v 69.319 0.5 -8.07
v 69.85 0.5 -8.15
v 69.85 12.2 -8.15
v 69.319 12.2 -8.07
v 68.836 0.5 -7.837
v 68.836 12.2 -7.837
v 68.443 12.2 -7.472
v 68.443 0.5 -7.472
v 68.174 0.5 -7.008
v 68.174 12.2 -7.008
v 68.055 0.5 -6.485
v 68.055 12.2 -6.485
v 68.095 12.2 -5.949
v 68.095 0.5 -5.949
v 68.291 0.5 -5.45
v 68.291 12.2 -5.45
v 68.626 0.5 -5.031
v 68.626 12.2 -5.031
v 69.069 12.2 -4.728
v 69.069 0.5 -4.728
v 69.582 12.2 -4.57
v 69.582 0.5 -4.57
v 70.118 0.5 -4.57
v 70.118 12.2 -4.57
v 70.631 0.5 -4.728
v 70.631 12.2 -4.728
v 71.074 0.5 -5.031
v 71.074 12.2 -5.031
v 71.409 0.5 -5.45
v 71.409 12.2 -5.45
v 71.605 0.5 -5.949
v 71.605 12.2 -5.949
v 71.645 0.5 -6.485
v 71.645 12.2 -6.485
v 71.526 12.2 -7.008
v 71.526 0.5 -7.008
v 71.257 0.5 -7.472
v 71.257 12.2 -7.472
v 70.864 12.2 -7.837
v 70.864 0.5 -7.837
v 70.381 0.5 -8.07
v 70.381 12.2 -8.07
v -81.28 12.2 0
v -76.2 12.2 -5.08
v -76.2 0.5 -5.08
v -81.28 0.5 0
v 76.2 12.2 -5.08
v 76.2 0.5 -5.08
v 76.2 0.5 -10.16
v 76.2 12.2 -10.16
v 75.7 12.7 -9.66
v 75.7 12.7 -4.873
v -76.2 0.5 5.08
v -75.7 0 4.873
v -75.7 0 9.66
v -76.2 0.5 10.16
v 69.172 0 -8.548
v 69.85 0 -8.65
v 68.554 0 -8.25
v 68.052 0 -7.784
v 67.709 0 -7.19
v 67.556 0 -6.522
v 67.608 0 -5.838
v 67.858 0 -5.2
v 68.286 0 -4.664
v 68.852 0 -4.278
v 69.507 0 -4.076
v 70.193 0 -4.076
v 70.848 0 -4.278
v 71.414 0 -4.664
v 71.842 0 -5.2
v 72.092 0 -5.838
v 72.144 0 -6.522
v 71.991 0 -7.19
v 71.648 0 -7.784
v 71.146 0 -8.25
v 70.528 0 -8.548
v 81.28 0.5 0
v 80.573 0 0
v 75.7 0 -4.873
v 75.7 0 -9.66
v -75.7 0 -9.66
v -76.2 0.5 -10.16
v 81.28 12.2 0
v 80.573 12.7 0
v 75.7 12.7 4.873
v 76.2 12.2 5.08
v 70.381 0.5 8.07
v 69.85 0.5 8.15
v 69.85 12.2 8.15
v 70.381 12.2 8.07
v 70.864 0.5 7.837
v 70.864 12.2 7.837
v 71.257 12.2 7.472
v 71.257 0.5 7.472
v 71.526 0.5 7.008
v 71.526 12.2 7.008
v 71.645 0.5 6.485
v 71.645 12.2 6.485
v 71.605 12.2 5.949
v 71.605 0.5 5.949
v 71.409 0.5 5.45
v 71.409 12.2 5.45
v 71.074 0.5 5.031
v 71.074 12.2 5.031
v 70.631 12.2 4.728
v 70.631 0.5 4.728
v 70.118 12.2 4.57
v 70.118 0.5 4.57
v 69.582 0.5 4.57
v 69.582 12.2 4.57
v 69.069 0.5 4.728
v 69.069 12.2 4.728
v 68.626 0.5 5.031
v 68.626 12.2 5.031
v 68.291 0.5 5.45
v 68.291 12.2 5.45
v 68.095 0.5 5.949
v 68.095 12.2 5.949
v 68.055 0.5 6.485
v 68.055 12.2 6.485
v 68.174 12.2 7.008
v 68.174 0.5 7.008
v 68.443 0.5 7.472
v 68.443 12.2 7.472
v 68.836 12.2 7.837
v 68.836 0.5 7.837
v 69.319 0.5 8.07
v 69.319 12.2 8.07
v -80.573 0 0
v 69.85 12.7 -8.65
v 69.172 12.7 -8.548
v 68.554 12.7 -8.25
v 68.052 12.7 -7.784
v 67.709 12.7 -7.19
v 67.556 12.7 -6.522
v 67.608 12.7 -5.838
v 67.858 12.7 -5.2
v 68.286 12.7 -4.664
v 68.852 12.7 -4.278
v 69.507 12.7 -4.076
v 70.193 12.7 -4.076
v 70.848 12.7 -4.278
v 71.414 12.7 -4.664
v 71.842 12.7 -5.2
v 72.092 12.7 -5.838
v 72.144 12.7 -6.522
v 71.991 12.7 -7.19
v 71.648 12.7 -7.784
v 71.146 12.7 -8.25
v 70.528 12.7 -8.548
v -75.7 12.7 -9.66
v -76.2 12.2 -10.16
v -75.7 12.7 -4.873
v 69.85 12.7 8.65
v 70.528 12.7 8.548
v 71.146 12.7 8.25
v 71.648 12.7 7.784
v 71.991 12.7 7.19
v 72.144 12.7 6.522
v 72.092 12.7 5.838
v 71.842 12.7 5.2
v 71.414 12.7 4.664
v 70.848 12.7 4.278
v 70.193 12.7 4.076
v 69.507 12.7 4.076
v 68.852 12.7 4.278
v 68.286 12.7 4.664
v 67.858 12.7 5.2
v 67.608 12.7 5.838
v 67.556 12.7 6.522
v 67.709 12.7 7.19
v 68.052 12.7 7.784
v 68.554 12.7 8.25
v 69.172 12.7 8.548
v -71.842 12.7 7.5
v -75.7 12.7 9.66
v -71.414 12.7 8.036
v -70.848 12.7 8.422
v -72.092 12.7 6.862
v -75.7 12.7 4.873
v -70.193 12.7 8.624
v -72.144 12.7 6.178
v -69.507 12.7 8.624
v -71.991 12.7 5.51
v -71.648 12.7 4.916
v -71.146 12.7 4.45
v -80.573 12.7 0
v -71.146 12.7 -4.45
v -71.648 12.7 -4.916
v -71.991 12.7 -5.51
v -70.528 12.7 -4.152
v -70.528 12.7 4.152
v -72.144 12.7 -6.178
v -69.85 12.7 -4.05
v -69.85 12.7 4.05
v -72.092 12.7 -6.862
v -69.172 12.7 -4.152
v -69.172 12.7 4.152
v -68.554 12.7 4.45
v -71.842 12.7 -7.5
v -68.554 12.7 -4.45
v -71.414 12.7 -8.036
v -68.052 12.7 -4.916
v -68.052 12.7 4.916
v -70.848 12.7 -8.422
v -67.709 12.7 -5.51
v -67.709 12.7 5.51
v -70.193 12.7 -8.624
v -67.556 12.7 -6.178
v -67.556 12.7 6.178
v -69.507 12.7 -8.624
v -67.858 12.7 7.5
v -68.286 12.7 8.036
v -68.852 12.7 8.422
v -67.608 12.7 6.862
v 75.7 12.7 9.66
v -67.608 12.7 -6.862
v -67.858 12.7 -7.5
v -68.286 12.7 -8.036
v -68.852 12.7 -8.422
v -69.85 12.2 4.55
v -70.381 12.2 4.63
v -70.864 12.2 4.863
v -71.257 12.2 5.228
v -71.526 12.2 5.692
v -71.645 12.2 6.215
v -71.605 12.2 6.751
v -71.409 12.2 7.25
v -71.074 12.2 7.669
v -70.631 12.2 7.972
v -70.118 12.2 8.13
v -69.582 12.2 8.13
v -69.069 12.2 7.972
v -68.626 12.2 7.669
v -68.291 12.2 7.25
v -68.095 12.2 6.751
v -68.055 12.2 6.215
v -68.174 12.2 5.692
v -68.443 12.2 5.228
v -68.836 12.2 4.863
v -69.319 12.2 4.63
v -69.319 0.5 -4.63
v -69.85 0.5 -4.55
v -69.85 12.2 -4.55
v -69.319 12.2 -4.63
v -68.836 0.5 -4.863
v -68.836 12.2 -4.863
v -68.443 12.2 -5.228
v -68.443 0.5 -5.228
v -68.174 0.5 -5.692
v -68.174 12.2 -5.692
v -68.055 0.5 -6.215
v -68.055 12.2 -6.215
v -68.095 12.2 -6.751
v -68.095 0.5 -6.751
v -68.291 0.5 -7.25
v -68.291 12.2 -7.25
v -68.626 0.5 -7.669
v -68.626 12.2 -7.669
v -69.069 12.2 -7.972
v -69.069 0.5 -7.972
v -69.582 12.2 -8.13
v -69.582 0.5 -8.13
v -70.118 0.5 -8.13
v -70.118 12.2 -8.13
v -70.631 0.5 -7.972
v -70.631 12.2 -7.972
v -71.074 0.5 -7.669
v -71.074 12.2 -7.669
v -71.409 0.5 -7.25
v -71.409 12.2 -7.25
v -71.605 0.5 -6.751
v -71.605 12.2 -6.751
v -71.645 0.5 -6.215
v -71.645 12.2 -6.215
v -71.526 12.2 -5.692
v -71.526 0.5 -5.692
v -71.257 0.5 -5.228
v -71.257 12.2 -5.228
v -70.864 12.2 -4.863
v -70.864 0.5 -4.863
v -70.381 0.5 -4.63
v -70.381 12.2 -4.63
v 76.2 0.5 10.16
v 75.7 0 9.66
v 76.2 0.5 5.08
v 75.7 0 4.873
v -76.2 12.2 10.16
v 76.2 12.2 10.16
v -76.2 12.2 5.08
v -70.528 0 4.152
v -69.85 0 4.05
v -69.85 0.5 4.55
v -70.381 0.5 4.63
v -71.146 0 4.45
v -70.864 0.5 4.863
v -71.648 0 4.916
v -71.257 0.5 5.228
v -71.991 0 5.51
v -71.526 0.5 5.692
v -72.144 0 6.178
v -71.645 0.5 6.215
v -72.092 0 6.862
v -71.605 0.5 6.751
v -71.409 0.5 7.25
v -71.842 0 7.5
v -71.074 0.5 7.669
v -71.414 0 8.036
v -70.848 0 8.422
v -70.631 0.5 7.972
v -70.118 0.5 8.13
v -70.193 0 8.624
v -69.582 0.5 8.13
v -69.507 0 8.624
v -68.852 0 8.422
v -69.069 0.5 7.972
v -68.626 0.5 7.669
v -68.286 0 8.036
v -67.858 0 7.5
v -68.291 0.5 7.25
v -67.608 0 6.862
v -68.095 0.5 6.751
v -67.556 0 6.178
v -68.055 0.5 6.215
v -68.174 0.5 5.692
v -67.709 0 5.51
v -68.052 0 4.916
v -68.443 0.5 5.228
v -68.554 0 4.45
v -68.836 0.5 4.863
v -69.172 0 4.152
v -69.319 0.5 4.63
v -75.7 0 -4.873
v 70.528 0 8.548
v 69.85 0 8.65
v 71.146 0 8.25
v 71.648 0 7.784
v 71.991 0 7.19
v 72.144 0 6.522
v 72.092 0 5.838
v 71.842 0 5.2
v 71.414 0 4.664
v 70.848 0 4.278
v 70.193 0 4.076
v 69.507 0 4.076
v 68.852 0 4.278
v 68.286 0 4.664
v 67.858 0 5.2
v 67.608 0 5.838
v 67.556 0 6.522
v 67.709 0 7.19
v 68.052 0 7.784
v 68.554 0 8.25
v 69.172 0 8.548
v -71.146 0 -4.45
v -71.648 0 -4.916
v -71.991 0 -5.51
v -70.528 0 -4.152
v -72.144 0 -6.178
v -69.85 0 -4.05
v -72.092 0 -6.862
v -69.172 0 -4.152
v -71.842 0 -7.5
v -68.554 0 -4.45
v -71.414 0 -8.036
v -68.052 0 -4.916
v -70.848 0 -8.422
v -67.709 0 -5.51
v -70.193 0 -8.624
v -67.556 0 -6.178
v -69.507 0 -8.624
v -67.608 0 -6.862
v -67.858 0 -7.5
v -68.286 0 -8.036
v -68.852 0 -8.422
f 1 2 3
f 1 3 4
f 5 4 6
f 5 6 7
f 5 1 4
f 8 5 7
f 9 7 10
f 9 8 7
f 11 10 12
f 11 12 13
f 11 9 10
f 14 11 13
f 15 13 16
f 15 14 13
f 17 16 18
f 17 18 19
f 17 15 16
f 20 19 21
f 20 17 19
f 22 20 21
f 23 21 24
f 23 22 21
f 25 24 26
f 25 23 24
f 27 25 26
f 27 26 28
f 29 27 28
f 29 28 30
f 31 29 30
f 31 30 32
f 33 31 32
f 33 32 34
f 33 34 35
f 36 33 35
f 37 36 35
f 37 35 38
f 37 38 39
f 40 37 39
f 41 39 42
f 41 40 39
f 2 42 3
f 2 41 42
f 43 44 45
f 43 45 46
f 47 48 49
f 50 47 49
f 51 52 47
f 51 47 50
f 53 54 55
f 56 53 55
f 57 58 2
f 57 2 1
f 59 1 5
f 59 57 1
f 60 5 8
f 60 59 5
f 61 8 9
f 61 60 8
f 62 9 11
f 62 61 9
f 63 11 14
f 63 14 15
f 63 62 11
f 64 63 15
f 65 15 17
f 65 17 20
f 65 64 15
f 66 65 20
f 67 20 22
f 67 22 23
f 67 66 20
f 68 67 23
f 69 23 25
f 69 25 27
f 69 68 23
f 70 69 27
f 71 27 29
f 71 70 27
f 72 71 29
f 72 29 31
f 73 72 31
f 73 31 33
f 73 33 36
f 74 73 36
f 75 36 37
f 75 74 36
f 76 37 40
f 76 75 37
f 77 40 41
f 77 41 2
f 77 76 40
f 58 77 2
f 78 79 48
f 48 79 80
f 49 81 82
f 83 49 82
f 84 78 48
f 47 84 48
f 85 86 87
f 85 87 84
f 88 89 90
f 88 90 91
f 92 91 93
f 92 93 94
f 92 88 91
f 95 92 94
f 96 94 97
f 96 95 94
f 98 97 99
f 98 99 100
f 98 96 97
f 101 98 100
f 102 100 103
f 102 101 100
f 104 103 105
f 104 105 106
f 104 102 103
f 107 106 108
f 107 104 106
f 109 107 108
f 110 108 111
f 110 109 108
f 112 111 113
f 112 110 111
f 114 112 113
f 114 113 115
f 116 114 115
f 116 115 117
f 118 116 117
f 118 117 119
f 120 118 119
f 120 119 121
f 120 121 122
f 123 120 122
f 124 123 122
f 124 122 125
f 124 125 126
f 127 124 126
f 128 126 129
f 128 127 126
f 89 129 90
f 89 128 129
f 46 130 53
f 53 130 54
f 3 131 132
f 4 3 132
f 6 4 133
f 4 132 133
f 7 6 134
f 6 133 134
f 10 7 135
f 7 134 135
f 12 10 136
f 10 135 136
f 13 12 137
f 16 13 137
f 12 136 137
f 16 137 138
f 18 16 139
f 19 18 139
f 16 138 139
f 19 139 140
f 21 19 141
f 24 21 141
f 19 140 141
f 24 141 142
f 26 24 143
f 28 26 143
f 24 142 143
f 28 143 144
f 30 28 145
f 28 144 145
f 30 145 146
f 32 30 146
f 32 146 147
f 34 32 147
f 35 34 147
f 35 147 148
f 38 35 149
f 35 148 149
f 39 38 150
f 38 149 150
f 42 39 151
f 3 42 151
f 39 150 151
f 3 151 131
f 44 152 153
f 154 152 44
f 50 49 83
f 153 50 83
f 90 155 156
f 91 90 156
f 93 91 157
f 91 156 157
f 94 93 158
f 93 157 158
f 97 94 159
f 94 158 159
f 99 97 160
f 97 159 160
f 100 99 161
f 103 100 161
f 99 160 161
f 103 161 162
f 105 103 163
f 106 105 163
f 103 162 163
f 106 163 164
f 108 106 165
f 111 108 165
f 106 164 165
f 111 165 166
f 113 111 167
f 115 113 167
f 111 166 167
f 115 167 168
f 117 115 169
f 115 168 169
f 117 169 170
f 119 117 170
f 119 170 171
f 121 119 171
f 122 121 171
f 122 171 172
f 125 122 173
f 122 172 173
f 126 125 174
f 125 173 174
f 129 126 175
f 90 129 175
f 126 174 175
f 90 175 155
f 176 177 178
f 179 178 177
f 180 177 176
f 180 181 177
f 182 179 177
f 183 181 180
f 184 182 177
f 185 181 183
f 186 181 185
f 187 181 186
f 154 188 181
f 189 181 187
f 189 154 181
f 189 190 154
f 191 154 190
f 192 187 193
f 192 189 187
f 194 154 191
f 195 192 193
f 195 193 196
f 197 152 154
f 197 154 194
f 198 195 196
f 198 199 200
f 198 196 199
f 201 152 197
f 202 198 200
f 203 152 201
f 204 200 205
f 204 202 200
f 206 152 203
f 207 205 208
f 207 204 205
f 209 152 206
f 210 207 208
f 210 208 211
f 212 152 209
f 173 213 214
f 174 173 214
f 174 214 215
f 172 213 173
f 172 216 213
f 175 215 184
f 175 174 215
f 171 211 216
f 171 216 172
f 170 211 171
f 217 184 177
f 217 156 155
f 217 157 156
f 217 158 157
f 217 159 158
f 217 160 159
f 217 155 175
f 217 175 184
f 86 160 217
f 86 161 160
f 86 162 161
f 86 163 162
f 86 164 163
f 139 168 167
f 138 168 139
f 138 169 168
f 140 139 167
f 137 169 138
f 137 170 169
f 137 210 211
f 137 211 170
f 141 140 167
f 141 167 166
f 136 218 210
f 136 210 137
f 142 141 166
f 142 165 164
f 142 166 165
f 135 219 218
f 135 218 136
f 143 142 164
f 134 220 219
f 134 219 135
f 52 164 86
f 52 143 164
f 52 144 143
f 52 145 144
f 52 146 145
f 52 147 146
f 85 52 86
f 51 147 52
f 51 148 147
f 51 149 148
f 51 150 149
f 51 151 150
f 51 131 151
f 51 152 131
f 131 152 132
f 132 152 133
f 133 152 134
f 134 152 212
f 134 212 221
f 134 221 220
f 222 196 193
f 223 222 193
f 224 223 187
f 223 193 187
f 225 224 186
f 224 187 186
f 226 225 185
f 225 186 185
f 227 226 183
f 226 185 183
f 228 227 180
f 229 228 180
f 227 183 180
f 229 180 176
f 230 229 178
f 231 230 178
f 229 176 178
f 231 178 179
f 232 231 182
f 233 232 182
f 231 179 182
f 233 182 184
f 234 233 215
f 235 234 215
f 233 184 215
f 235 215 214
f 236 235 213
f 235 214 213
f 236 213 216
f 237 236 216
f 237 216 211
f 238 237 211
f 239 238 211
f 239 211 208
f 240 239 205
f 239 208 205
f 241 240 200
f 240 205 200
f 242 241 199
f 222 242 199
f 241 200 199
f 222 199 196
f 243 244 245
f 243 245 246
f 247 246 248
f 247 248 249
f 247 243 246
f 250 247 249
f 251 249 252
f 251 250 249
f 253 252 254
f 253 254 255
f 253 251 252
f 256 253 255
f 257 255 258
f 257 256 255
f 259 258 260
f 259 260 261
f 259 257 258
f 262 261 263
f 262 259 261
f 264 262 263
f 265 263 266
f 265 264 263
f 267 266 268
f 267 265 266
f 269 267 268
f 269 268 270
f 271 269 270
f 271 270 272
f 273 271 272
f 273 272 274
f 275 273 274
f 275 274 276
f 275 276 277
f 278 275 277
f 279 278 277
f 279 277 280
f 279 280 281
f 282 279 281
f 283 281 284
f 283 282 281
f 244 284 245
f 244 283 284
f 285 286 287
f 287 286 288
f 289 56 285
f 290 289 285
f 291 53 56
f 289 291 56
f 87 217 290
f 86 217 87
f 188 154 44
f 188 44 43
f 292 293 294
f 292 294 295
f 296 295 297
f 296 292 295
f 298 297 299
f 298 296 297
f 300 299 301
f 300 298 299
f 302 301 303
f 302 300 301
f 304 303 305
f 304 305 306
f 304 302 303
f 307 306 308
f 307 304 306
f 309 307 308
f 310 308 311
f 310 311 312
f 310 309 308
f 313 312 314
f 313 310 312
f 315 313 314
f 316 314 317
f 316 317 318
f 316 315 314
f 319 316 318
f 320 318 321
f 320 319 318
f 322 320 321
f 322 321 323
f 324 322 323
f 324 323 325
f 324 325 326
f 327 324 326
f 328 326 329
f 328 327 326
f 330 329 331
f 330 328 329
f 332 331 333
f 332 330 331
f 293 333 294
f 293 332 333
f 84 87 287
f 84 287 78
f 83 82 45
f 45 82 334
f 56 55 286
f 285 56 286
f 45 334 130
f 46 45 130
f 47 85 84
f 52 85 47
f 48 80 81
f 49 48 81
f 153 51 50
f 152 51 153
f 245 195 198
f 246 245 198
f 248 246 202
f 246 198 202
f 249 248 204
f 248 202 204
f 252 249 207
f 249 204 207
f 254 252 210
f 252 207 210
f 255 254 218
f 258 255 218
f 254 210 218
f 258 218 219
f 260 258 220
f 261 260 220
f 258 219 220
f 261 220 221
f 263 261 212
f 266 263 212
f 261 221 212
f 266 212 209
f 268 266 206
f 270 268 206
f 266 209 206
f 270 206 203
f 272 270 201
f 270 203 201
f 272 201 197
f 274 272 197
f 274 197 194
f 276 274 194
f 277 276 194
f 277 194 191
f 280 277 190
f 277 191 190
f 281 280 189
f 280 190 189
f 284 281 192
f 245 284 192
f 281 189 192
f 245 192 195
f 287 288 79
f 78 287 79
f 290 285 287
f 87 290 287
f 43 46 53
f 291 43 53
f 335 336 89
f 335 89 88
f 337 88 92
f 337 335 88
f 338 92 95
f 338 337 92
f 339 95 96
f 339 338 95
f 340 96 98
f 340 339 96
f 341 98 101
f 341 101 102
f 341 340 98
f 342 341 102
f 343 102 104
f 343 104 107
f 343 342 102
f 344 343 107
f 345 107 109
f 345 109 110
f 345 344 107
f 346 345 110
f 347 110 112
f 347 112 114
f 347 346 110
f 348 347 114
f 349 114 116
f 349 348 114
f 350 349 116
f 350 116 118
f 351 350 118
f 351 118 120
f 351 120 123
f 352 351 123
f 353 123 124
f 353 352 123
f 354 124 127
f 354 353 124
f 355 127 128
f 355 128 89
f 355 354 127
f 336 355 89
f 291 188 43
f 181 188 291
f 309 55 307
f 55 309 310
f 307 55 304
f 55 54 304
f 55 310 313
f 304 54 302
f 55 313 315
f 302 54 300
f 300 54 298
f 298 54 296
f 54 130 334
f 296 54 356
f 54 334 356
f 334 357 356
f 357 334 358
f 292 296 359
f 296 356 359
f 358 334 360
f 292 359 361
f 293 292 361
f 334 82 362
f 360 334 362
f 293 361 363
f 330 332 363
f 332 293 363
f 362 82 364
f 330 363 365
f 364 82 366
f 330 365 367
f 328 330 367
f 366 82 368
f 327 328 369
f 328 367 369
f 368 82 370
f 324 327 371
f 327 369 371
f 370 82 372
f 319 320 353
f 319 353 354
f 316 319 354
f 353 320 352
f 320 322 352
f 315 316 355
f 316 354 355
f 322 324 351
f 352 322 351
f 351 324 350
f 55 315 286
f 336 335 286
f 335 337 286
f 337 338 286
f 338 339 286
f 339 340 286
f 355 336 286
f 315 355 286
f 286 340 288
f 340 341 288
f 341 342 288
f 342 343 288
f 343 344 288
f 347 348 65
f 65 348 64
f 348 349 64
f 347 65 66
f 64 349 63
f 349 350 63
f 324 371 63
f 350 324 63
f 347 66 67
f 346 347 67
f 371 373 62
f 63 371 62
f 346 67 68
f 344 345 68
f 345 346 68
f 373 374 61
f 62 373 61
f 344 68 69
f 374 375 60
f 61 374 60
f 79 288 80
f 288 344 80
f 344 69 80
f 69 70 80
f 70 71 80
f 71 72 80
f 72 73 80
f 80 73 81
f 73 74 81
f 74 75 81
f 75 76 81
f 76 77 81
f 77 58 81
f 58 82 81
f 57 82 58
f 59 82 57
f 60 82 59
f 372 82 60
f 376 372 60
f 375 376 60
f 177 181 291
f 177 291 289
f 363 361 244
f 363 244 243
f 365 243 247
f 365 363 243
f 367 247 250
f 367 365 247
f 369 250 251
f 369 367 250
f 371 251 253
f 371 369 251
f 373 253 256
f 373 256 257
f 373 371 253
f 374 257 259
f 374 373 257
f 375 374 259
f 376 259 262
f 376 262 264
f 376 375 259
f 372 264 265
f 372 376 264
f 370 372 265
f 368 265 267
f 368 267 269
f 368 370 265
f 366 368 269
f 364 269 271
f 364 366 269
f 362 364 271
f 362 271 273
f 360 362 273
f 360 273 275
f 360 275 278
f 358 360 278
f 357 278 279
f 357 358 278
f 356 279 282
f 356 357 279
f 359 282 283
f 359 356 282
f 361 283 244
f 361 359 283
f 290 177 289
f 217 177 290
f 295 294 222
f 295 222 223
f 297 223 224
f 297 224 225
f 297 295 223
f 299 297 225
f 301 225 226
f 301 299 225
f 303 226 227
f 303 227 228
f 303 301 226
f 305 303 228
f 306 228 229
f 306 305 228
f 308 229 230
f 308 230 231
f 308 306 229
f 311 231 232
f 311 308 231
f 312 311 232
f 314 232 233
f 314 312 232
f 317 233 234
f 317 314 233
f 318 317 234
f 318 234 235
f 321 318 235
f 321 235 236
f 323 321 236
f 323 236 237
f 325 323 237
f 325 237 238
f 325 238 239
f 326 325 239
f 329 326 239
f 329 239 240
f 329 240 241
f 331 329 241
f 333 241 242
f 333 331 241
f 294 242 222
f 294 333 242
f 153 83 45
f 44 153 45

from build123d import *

# Parameters (mm, degrees)
SKETCH1_R           = 1.8
BOSS_EXTRUDE1_DEPTH = 12.7
CHAMFER1_SIZE       = 0.5


with BuildPart() as part:
    # Sketch1 → Boss-Extrude1 (new body)
    with BuildSketch(Plane(origin=(0, 0, 0), x_dir=(1, 0, 0), z_dir=(0, 1, 0))):
        Polygon((-76.2, 5.08), (-81.28, 0), (-76.2, -5.08), (-76.2, -10.16), (76.2, -10.16), (76.2, -5.08), (81.28, 0), (76.2, 5.08), (76.2, 10.16), (-76.2, 10.16), align=None)
        with Locations(Location((-69.85, 6.35, 0), (0, 0, 270))):
            Circle(SKETCH1_R, mode=Mode.SUBTRACT)
        with Locations(Location((-69.85, -6.35, 0), (0, 0, 90))):
            Circle(SKETCH1_R, mode=Mode.SUBTRACT)
        with Locations(Location((69.85, -6.35, 0), (0, 0, 270))):
            Circle(SKETCH1_R, mode=Mode.SUBTRACT)
        with Locations(Location((69.85, 6.35, 0), (0, 0, 90))):
            Circle(SKETCH1_R, mode=Mode.SUBTRACT)
    extrude(amount=BOSS_EXTRUDE1_DEPTH)

    # Chamfer1
    chamfer1_edges = [part.edges().sort_by_distance(p)[0] for p in [
        (0, 0, 10.16),
        (-76.2, 0, 7.62),
        (-78.74, 0, 2.54),
        (-78.74, 0, -2.54),
        (-76.2, 0, -7.62),
        (0, 0, -10.16),
        (76.2, 0, -7.62),
        (78.74, 12.7, -2.54),
        (78.74, 0, -2.54),
        (78.74, 0, 2.54),
        (76.2, 0, 7.62),
        (76.2, 12.7, -7.62),
        (0, 12.7, -10.16),
        (-76.2, 12.7, -7.62),
        (-69.85, 0, -8.15),
        (-69.85, 12.7, -8.15),
        (-78.74, 12.7, -2.54),
        (-69.85, 0, 8.15),
        (-69.85, 12.7, 8.15),
        (-78.74, 12.7, 2.54),
        (69.85, 0, 4.55),
        (69.85, 12.7, 4.55),
        (-76.2, 12.7, 7.62),
        (69.85, 0, -4.55),
        (69.85, 12.7, -4.55),
        (0, 12.7, 10.16),
        (76.2, 12.7, 7.62),
        (78.74, 12.7, 2.54),
    ]]
    chamfer(chamfer1_edges, length=CHAMFER1_SIZE)


solid = part.part
